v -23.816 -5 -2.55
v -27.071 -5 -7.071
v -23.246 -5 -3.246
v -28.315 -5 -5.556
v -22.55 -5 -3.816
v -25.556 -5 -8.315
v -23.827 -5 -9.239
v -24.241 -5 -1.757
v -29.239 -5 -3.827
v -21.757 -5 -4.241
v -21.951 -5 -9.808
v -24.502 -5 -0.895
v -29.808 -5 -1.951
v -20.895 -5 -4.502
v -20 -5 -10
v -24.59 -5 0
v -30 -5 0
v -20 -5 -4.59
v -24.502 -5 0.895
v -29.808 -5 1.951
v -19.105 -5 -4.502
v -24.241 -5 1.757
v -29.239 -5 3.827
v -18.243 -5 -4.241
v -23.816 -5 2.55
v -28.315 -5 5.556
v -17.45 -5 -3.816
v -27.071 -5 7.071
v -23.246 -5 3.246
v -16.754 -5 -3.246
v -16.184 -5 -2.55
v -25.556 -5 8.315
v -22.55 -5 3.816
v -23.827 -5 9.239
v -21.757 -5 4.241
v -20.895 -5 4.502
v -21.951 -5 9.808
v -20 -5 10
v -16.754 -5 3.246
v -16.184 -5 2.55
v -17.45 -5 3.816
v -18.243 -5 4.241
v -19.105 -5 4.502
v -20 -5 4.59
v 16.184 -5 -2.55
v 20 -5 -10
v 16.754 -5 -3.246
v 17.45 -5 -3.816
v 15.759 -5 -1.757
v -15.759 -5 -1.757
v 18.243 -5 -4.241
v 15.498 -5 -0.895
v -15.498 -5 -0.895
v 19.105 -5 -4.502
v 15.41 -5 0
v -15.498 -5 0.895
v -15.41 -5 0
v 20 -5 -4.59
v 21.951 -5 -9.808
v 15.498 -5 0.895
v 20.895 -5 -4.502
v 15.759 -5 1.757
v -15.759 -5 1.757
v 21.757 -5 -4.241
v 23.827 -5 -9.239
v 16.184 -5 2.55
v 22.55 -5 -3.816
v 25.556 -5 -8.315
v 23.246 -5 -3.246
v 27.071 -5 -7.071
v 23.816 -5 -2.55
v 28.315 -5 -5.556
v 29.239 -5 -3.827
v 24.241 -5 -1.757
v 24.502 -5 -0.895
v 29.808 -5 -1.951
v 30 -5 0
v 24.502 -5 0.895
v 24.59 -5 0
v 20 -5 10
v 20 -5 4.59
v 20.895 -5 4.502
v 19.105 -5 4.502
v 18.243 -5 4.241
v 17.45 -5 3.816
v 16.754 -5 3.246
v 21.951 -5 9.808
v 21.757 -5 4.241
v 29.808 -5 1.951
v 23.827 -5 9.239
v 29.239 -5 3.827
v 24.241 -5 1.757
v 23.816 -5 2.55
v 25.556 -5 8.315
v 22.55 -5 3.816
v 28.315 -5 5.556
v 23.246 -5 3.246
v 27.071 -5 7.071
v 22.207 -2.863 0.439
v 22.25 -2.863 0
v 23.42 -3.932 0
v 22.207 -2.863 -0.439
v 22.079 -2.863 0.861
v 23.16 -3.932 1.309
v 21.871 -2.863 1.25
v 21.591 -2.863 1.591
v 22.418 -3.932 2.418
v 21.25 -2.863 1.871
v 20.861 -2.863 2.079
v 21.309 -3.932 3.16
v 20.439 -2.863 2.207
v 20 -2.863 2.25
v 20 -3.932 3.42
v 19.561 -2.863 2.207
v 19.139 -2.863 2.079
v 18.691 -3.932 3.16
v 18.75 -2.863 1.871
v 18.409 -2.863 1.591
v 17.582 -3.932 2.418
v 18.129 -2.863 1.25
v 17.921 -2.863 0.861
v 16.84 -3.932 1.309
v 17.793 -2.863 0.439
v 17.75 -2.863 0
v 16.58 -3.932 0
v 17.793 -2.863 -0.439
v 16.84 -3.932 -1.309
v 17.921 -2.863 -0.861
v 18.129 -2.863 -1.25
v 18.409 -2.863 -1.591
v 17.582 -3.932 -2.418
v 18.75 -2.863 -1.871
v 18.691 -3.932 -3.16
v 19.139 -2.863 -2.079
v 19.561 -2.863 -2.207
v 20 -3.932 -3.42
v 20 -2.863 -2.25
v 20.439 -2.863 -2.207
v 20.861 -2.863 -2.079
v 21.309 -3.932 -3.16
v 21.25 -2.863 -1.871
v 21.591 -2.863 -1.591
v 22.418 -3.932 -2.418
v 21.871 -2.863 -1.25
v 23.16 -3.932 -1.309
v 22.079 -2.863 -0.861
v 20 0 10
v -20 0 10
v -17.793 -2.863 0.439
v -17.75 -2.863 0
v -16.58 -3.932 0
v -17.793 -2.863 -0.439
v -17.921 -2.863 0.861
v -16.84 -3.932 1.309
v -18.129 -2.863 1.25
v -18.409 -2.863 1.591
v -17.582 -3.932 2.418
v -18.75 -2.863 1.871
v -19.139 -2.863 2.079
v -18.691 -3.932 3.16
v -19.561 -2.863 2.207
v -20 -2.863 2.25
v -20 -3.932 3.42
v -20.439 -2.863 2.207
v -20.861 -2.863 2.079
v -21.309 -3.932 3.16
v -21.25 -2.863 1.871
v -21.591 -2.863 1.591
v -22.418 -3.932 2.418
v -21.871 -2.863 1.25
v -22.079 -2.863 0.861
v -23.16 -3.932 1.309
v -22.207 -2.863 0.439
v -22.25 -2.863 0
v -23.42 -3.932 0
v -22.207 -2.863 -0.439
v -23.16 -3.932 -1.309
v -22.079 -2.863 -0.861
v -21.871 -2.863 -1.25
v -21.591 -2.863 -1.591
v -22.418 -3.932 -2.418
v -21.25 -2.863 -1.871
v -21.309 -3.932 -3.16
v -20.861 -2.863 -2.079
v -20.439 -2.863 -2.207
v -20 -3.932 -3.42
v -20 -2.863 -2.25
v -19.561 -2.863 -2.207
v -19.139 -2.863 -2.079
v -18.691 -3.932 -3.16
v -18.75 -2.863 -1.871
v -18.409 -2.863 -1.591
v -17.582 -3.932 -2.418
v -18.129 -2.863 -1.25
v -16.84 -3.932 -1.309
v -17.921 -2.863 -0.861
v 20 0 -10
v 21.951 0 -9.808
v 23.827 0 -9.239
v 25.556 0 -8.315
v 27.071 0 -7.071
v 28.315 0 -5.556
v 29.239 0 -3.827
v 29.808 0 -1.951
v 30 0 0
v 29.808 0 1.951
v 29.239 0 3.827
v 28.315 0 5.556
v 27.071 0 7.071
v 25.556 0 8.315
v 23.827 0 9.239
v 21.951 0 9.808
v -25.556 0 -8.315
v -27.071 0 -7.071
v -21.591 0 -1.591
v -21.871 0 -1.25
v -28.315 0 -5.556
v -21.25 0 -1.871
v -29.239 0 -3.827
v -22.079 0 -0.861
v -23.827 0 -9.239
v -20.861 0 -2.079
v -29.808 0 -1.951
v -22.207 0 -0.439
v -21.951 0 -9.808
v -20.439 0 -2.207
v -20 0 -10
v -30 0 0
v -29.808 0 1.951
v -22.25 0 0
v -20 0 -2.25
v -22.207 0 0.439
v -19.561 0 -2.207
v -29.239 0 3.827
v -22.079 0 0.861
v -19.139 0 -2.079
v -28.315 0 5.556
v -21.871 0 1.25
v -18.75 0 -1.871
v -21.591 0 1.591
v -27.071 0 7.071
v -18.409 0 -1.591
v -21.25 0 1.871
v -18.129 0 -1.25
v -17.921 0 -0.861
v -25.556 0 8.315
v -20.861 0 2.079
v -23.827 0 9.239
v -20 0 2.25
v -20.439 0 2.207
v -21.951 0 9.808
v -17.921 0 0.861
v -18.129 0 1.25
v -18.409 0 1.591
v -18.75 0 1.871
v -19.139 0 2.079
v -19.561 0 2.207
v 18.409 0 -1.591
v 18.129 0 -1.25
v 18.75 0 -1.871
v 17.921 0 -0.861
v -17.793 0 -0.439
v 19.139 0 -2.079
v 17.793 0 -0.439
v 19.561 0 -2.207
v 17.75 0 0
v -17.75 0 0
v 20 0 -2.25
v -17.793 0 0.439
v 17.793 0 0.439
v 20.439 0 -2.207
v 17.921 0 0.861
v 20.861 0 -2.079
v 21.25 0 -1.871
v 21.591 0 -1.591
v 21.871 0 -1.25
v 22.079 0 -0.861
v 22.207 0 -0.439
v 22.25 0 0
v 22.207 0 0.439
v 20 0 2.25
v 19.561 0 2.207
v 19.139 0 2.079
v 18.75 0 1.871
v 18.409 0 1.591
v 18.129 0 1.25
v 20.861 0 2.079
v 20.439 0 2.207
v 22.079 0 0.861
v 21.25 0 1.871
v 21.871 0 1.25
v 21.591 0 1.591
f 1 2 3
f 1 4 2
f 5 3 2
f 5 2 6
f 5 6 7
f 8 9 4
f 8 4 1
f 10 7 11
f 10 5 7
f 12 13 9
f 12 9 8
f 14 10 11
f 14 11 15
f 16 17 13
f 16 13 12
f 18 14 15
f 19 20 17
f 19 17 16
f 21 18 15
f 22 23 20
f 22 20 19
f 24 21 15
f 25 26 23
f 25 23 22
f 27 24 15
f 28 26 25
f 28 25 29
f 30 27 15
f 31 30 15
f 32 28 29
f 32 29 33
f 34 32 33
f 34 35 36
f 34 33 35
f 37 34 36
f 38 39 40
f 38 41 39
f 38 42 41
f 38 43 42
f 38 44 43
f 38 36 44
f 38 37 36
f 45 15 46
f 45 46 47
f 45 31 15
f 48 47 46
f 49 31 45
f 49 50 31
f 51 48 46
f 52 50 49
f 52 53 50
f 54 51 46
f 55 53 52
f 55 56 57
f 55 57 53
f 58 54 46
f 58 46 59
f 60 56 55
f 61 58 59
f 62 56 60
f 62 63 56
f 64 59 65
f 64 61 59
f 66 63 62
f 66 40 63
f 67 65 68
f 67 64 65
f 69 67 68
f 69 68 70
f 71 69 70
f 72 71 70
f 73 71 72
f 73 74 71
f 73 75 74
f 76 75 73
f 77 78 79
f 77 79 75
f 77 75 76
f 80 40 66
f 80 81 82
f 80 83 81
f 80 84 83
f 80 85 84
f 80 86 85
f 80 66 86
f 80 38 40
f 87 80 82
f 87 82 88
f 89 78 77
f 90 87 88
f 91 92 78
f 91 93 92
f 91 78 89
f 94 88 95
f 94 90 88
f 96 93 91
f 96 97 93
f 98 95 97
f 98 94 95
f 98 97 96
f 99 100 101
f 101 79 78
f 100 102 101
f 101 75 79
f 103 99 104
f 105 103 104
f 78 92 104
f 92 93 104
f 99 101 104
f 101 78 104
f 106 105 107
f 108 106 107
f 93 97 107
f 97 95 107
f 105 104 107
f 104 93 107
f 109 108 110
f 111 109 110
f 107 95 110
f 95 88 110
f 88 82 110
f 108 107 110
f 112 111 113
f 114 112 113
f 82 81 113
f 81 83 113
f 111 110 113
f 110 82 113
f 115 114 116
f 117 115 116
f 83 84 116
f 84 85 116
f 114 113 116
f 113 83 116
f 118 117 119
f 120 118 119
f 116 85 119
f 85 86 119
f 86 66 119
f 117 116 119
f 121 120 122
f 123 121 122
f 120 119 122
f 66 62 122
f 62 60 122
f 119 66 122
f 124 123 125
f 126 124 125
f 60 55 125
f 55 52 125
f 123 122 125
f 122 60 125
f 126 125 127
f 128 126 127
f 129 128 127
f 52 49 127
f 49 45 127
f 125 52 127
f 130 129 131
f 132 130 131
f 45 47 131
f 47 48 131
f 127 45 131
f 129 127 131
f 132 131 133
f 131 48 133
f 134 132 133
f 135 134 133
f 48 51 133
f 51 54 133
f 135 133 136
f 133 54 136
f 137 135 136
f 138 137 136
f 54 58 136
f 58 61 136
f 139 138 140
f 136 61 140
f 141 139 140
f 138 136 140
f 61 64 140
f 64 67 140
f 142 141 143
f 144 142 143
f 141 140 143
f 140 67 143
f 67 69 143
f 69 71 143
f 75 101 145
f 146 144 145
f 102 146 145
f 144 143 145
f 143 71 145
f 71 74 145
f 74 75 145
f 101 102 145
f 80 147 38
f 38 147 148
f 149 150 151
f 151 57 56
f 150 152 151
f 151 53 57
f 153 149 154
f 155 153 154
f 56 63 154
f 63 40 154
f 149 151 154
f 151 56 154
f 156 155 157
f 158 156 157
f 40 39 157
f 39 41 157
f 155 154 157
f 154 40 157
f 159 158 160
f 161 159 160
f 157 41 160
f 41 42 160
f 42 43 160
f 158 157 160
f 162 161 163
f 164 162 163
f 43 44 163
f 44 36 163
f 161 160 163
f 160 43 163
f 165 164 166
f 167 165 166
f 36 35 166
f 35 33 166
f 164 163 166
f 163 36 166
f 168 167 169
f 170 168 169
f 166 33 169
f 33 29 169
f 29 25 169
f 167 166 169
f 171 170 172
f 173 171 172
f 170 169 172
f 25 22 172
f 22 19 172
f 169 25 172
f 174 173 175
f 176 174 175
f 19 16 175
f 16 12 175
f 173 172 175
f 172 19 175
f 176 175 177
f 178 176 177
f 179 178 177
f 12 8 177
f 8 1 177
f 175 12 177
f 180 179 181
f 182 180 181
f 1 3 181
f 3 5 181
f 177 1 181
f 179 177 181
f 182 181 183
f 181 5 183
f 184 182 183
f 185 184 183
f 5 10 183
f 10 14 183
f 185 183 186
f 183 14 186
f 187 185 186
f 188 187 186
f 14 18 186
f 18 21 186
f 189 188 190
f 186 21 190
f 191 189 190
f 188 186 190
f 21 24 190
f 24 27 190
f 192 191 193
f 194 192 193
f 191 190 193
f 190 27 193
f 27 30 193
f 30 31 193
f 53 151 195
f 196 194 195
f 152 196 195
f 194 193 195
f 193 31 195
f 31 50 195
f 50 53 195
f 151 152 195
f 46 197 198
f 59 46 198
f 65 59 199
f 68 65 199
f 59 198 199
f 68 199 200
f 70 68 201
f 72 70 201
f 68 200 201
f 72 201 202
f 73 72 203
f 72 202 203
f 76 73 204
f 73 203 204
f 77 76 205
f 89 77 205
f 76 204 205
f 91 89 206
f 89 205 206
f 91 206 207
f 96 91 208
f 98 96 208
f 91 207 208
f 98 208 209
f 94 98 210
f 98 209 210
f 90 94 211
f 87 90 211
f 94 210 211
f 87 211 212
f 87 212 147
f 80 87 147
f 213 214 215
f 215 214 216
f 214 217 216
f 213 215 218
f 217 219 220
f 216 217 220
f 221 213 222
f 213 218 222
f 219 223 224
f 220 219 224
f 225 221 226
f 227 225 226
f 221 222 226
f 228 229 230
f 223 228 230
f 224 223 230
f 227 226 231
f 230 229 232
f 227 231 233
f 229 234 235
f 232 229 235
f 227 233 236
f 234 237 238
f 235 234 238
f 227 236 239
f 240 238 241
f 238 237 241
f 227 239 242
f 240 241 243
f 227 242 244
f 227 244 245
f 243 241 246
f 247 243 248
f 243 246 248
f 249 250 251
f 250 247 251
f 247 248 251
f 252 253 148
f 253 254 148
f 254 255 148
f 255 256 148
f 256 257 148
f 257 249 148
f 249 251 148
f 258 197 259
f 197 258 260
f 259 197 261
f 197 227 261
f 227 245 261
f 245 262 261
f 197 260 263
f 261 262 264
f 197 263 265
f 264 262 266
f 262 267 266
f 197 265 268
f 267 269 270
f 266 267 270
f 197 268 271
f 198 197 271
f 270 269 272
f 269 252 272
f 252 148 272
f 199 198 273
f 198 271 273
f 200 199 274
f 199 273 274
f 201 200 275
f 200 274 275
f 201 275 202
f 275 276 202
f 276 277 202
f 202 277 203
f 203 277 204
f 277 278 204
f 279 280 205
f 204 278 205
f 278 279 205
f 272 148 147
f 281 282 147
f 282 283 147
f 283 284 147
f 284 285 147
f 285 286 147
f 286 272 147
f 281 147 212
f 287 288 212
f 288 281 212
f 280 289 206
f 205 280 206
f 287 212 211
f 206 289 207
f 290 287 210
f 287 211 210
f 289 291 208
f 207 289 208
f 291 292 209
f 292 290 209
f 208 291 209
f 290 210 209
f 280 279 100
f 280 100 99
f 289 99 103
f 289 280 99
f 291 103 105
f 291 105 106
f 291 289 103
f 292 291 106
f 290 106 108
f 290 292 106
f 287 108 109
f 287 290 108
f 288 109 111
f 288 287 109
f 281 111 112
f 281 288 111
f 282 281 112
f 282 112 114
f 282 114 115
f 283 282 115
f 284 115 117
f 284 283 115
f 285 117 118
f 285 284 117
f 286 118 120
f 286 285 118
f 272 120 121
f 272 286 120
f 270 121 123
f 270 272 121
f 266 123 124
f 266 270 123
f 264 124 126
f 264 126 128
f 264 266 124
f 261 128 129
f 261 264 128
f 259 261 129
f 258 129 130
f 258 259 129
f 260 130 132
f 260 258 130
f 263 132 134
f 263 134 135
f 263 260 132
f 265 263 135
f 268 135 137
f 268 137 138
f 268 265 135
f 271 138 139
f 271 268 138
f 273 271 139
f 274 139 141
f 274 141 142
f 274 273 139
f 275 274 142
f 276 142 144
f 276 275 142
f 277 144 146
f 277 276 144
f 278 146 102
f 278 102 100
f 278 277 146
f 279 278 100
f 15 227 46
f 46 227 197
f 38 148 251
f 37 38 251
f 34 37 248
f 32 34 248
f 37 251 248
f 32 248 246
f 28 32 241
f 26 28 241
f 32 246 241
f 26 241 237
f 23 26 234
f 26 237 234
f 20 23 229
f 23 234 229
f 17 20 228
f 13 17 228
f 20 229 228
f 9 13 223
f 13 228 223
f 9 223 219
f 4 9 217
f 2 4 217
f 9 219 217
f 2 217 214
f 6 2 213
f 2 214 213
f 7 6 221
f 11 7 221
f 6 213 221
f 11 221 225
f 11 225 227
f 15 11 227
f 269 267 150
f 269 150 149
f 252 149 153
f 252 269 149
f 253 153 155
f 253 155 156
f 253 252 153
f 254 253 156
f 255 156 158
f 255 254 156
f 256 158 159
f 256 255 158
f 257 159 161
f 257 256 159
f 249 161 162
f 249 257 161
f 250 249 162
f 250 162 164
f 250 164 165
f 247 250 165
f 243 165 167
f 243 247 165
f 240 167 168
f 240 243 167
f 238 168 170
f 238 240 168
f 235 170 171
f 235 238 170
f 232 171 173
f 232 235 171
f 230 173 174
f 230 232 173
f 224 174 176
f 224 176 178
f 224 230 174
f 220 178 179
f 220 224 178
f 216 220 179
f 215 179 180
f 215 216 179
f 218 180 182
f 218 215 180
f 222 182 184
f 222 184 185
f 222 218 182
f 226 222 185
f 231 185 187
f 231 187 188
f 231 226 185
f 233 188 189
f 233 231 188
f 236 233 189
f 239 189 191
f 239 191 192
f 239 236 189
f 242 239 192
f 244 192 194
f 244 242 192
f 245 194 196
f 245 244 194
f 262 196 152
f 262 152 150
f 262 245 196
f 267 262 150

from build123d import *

# Parameters (mm, degrees)
F0_R     = 2.25
F1_DEPTH = 5
F2_SIZE2 = 2.34
F2_SIZE  = 2.137


with BuildPart() as f1:
    # F0 (on Front) → F1 (new body)
    with BuildSketch(Plane.XZ):
        with BuildLine():
            Line((20, 10), (-20, 10))
            ThreePointArc((-20, 10), (-30, 0), (-20, -10))
            Line((-20, -10), (20, -10))
            ThreePointArc((20, -10), (30, 0), (20, 10))
        make_face()
        with Locations((-20, 0)):
            Circle(F0_R, mode=Mode.SUBTRACT)
        with Locations((20, 0)):
            Circle(F0_R, mode=Mode.SUBTRACT)
    extrude(amount=F1_DEPTH)

    # F2
    f2_edges = [f1.edges().sort_by_distance(p)[0] for p in [
        (17.75, -5, 0),
        (-22.25, -5, 0),
    ]]
    chamfer(f2_edges, length=F2_SIZE, length2=F2_SIZE2)


solid = f1.part
